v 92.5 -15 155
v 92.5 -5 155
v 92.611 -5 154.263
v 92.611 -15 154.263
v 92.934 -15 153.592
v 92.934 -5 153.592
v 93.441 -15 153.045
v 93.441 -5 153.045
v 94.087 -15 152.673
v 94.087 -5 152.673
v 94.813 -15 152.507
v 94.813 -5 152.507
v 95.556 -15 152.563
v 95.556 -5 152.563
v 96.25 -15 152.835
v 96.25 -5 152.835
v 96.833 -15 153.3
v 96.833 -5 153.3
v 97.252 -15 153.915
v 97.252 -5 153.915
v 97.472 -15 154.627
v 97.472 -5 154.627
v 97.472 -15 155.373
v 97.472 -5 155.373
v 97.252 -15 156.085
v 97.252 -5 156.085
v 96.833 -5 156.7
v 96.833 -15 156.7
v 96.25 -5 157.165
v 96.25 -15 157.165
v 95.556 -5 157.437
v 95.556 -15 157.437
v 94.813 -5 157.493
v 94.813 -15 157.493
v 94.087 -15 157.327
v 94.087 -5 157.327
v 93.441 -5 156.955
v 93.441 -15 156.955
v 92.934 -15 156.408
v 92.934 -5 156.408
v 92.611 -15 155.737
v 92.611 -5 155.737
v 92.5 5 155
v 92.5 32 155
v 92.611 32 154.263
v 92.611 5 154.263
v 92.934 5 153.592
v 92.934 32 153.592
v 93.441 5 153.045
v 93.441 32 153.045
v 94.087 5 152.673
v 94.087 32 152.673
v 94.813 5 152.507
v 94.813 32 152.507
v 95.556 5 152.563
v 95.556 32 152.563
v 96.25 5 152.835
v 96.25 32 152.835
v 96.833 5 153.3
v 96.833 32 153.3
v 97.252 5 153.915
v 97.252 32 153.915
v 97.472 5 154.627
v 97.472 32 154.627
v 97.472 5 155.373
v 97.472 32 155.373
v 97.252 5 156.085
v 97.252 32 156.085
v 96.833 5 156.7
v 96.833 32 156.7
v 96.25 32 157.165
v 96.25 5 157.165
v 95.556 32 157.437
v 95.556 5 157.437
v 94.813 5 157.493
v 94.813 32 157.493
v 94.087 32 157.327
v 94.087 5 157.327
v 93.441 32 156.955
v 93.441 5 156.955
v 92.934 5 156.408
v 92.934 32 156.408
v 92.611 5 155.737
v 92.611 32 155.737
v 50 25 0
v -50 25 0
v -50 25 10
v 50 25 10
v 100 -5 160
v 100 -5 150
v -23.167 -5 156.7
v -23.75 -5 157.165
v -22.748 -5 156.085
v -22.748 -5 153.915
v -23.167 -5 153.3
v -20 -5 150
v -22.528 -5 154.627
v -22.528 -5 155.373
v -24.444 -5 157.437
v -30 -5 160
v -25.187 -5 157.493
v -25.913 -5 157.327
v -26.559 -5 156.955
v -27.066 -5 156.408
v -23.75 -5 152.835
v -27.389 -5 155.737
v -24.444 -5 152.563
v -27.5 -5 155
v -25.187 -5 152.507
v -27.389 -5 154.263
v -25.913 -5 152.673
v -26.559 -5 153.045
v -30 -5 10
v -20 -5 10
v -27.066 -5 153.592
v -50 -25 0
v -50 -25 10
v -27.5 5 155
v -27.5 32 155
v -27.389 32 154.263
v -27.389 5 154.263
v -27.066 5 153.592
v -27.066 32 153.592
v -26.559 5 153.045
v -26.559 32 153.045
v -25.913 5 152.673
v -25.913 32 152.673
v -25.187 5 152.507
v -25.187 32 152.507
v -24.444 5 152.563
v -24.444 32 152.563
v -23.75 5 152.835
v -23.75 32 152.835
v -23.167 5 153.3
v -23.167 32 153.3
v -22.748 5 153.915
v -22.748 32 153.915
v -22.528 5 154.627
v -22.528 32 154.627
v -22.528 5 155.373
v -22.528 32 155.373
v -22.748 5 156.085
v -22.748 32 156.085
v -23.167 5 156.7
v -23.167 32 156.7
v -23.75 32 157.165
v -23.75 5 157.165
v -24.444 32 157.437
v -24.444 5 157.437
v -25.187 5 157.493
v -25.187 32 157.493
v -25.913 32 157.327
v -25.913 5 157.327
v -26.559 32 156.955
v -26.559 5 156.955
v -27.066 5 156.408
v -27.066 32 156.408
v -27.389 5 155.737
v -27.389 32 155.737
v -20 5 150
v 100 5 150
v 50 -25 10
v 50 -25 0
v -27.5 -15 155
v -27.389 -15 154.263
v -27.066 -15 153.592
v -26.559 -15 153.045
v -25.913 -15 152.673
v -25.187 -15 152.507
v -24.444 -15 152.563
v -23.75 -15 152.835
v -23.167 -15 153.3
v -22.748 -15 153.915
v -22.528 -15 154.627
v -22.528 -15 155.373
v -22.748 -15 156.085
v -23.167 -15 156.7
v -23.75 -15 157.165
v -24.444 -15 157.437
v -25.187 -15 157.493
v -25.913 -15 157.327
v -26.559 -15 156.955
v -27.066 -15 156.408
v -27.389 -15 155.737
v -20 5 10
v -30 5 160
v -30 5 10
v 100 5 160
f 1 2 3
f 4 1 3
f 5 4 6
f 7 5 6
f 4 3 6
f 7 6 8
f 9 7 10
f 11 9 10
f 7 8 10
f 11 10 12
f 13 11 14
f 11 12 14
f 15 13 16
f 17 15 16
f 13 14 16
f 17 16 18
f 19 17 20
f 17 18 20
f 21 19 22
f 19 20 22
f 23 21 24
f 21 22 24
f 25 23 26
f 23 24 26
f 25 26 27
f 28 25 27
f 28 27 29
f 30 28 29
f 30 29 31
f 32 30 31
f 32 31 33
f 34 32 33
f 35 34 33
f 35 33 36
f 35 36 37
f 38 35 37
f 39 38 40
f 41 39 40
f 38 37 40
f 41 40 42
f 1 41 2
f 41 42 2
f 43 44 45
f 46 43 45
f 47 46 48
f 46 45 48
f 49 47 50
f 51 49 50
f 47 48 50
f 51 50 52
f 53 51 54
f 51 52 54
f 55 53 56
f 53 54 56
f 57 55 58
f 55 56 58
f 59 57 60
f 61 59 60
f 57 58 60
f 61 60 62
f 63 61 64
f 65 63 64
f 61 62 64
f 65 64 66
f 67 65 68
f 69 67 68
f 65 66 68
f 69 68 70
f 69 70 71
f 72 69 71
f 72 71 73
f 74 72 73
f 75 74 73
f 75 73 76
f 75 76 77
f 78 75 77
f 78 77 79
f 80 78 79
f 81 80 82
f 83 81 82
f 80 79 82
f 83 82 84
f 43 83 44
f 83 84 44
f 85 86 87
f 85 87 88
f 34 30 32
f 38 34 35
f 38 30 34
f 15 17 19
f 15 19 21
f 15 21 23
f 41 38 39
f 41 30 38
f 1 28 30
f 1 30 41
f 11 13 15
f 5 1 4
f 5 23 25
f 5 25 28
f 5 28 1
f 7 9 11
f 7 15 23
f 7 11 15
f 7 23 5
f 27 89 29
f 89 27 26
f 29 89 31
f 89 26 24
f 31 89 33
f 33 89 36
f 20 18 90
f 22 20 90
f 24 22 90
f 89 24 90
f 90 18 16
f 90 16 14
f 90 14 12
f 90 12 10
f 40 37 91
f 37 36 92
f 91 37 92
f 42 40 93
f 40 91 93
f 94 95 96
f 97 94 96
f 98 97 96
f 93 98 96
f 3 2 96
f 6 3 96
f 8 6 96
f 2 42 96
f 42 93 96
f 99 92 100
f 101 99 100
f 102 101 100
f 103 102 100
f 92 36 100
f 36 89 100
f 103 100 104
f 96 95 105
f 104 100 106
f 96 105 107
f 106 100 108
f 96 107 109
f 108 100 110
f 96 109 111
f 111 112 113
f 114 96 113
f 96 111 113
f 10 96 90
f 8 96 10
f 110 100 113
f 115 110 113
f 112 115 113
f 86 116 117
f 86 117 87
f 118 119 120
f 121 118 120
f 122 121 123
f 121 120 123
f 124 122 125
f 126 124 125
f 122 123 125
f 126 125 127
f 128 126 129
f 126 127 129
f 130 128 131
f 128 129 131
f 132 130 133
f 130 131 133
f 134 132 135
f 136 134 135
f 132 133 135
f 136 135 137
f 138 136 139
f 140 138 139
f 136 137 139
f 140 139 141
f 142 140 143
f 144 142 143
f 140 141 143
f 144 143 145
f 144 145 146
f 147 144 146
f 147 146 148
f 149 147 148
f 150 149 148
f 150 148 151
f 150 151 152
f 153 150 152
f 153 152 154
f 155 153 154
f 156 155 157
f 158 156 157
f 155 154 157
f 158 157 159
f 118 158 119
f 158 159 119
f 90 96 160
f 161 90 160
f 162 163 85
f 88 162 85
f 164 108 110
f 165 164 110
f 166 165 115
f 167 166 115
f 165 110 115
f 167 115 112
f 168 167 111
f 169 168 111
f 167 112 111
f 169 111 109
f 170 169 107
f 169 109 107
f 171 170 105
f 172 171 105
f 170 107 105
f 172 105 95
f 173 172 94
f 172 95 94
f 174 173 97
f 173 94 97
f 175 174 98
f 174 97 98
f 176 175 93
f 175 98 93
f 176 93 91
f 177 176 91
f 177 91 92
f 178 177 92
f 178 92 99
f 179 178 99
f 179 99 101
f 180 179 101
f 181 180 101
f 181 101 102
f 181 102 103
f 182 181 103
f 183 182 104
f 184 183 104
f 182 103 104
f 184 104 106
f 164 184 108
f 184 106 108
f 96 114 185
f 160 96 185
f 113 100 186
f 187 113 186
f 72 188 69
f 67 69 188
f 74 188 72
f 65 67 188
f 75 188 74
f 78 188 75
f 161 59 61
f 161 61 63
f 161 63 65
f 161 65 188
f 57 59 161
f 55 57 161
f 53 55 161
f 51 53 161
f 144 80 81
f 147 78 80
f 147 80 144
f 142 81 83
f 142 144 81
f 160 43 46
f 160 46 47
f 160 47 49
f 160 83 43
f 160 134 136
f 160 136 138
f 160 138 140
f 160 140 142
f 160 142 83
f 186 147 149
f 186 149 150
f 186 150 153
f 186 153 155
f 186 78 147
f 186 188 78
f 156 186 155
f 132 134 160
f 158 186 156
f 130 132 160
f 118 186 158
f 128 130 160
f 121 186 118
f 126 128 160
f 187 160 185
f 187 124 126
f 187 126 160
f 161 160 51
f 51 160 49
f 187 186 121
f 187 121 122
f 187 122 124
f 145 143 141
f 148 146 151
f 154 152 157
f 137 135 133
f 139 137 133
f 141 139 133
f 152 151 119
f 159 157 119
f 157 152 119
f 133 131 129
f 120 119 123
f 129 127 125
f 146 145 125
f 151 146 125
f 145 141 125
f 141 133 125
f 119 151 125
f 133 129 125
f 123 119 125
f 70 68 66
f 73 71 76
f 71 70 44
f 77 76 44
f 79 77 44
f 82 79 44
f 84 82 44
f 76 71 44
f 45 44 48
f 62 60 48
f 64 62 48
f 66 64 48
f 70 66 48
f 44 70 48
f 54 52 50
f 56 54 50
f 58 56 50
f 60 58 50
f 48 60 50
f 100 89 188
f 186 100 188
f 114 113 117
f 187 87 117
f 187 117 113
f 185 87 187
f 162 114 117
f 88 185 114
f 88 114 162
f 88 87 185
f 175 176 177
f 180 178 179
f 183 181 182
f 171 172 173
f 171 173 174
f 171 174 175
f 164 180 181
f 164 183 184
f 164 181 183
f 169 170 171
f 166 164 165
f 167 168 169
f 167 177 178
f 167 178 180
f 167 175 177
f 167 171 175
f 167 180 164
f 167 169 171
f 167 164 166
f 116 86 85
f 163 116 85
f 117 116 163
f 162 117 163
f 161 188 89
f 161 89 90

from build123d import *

# Parameters (mm, degrees)
SKETCH1_W           = 100
SKETCH1_H           = 50
BOSS_EXTRUDE1_DEPTH = 10
SKETCH2_W           = 10
SKETCH2_H           = 10
BOSS_EXTRUDE2_DEPTH = 150
SKETCH3_W           = 10
SKETCH3_H           = 10
BOSS_EXTRUDE3_DEPTH = 120
SKETCH4_R           = 2.5
BOSS_EXTRUDE4_DEPTH = 10
BOSS_EXTRUDE5_START = -27
SKETCH5_R           = 2.5
BOSS_EXTRUDE5_DEPTH = 27


with BuildPart() as part:
    # Sketch1 → Boss-Extrude1 (new body)
    with BuildSketch(Plane.XY):
        Rectangle(SKETCH1_W, SKETCH1_H)
    extrude(amount=BOSS_EXTRUDE1_DEPTH)

    # Sketch2 → Boss-Extrude2 (add)
    with BuildSketch(Plane.XY.offset(10)):
        with Locations((-25, 0)):
            Rectangle(SKETCH2_W, SKETCH2_H)
    extrude(amount=BOSS_EXTRUDE2_DEPTH)

    # Sketch3 → Boss-Extrude3 (add)
    with BuildSketch(Plane(origin=(-20, 0, 0), x_dir=(0, 0, -1), z_dir=(1, 0, 0))):
        with Locations((-155, 0)):
            Rectangle(SKETCH3_W, SKETCH3_H)
    extrude(amount=BOSS_EXTRUDE3_DEPTH)

    # Sketch4 → Boss-Extrude4 (add)
    with BuildSketch(Plane.XZ.offset(5)):
        with Locations(Location((-25, 155, 0), (0, 0, 180))):
            Circle(SKETCH4_R)
        with Locations(Location((95, 155, 0), (0, 0, 180))):
            Circle(SKETCH4_R)
    extrude(amount=BOSS_EXTRUDE4_DEPTH)

    # Sketch5 → Boss-Extrude5 (add)
    with BuildSketch(Plane(origin=(0, 5, -5), x_dir=(-1, 0, 0), z_dir=(0, -1, 0)).offset(BOSS_EXTRUDE5_START)):
        with Locations((-95, -160)):
            Circle(SKETCH5_R)
        with Locations((25, -160)):
            Circle(SKETCH5_R)
    extrude(amount=BOSS_EXTRUDE5_DEPTH)


solid = part.part
